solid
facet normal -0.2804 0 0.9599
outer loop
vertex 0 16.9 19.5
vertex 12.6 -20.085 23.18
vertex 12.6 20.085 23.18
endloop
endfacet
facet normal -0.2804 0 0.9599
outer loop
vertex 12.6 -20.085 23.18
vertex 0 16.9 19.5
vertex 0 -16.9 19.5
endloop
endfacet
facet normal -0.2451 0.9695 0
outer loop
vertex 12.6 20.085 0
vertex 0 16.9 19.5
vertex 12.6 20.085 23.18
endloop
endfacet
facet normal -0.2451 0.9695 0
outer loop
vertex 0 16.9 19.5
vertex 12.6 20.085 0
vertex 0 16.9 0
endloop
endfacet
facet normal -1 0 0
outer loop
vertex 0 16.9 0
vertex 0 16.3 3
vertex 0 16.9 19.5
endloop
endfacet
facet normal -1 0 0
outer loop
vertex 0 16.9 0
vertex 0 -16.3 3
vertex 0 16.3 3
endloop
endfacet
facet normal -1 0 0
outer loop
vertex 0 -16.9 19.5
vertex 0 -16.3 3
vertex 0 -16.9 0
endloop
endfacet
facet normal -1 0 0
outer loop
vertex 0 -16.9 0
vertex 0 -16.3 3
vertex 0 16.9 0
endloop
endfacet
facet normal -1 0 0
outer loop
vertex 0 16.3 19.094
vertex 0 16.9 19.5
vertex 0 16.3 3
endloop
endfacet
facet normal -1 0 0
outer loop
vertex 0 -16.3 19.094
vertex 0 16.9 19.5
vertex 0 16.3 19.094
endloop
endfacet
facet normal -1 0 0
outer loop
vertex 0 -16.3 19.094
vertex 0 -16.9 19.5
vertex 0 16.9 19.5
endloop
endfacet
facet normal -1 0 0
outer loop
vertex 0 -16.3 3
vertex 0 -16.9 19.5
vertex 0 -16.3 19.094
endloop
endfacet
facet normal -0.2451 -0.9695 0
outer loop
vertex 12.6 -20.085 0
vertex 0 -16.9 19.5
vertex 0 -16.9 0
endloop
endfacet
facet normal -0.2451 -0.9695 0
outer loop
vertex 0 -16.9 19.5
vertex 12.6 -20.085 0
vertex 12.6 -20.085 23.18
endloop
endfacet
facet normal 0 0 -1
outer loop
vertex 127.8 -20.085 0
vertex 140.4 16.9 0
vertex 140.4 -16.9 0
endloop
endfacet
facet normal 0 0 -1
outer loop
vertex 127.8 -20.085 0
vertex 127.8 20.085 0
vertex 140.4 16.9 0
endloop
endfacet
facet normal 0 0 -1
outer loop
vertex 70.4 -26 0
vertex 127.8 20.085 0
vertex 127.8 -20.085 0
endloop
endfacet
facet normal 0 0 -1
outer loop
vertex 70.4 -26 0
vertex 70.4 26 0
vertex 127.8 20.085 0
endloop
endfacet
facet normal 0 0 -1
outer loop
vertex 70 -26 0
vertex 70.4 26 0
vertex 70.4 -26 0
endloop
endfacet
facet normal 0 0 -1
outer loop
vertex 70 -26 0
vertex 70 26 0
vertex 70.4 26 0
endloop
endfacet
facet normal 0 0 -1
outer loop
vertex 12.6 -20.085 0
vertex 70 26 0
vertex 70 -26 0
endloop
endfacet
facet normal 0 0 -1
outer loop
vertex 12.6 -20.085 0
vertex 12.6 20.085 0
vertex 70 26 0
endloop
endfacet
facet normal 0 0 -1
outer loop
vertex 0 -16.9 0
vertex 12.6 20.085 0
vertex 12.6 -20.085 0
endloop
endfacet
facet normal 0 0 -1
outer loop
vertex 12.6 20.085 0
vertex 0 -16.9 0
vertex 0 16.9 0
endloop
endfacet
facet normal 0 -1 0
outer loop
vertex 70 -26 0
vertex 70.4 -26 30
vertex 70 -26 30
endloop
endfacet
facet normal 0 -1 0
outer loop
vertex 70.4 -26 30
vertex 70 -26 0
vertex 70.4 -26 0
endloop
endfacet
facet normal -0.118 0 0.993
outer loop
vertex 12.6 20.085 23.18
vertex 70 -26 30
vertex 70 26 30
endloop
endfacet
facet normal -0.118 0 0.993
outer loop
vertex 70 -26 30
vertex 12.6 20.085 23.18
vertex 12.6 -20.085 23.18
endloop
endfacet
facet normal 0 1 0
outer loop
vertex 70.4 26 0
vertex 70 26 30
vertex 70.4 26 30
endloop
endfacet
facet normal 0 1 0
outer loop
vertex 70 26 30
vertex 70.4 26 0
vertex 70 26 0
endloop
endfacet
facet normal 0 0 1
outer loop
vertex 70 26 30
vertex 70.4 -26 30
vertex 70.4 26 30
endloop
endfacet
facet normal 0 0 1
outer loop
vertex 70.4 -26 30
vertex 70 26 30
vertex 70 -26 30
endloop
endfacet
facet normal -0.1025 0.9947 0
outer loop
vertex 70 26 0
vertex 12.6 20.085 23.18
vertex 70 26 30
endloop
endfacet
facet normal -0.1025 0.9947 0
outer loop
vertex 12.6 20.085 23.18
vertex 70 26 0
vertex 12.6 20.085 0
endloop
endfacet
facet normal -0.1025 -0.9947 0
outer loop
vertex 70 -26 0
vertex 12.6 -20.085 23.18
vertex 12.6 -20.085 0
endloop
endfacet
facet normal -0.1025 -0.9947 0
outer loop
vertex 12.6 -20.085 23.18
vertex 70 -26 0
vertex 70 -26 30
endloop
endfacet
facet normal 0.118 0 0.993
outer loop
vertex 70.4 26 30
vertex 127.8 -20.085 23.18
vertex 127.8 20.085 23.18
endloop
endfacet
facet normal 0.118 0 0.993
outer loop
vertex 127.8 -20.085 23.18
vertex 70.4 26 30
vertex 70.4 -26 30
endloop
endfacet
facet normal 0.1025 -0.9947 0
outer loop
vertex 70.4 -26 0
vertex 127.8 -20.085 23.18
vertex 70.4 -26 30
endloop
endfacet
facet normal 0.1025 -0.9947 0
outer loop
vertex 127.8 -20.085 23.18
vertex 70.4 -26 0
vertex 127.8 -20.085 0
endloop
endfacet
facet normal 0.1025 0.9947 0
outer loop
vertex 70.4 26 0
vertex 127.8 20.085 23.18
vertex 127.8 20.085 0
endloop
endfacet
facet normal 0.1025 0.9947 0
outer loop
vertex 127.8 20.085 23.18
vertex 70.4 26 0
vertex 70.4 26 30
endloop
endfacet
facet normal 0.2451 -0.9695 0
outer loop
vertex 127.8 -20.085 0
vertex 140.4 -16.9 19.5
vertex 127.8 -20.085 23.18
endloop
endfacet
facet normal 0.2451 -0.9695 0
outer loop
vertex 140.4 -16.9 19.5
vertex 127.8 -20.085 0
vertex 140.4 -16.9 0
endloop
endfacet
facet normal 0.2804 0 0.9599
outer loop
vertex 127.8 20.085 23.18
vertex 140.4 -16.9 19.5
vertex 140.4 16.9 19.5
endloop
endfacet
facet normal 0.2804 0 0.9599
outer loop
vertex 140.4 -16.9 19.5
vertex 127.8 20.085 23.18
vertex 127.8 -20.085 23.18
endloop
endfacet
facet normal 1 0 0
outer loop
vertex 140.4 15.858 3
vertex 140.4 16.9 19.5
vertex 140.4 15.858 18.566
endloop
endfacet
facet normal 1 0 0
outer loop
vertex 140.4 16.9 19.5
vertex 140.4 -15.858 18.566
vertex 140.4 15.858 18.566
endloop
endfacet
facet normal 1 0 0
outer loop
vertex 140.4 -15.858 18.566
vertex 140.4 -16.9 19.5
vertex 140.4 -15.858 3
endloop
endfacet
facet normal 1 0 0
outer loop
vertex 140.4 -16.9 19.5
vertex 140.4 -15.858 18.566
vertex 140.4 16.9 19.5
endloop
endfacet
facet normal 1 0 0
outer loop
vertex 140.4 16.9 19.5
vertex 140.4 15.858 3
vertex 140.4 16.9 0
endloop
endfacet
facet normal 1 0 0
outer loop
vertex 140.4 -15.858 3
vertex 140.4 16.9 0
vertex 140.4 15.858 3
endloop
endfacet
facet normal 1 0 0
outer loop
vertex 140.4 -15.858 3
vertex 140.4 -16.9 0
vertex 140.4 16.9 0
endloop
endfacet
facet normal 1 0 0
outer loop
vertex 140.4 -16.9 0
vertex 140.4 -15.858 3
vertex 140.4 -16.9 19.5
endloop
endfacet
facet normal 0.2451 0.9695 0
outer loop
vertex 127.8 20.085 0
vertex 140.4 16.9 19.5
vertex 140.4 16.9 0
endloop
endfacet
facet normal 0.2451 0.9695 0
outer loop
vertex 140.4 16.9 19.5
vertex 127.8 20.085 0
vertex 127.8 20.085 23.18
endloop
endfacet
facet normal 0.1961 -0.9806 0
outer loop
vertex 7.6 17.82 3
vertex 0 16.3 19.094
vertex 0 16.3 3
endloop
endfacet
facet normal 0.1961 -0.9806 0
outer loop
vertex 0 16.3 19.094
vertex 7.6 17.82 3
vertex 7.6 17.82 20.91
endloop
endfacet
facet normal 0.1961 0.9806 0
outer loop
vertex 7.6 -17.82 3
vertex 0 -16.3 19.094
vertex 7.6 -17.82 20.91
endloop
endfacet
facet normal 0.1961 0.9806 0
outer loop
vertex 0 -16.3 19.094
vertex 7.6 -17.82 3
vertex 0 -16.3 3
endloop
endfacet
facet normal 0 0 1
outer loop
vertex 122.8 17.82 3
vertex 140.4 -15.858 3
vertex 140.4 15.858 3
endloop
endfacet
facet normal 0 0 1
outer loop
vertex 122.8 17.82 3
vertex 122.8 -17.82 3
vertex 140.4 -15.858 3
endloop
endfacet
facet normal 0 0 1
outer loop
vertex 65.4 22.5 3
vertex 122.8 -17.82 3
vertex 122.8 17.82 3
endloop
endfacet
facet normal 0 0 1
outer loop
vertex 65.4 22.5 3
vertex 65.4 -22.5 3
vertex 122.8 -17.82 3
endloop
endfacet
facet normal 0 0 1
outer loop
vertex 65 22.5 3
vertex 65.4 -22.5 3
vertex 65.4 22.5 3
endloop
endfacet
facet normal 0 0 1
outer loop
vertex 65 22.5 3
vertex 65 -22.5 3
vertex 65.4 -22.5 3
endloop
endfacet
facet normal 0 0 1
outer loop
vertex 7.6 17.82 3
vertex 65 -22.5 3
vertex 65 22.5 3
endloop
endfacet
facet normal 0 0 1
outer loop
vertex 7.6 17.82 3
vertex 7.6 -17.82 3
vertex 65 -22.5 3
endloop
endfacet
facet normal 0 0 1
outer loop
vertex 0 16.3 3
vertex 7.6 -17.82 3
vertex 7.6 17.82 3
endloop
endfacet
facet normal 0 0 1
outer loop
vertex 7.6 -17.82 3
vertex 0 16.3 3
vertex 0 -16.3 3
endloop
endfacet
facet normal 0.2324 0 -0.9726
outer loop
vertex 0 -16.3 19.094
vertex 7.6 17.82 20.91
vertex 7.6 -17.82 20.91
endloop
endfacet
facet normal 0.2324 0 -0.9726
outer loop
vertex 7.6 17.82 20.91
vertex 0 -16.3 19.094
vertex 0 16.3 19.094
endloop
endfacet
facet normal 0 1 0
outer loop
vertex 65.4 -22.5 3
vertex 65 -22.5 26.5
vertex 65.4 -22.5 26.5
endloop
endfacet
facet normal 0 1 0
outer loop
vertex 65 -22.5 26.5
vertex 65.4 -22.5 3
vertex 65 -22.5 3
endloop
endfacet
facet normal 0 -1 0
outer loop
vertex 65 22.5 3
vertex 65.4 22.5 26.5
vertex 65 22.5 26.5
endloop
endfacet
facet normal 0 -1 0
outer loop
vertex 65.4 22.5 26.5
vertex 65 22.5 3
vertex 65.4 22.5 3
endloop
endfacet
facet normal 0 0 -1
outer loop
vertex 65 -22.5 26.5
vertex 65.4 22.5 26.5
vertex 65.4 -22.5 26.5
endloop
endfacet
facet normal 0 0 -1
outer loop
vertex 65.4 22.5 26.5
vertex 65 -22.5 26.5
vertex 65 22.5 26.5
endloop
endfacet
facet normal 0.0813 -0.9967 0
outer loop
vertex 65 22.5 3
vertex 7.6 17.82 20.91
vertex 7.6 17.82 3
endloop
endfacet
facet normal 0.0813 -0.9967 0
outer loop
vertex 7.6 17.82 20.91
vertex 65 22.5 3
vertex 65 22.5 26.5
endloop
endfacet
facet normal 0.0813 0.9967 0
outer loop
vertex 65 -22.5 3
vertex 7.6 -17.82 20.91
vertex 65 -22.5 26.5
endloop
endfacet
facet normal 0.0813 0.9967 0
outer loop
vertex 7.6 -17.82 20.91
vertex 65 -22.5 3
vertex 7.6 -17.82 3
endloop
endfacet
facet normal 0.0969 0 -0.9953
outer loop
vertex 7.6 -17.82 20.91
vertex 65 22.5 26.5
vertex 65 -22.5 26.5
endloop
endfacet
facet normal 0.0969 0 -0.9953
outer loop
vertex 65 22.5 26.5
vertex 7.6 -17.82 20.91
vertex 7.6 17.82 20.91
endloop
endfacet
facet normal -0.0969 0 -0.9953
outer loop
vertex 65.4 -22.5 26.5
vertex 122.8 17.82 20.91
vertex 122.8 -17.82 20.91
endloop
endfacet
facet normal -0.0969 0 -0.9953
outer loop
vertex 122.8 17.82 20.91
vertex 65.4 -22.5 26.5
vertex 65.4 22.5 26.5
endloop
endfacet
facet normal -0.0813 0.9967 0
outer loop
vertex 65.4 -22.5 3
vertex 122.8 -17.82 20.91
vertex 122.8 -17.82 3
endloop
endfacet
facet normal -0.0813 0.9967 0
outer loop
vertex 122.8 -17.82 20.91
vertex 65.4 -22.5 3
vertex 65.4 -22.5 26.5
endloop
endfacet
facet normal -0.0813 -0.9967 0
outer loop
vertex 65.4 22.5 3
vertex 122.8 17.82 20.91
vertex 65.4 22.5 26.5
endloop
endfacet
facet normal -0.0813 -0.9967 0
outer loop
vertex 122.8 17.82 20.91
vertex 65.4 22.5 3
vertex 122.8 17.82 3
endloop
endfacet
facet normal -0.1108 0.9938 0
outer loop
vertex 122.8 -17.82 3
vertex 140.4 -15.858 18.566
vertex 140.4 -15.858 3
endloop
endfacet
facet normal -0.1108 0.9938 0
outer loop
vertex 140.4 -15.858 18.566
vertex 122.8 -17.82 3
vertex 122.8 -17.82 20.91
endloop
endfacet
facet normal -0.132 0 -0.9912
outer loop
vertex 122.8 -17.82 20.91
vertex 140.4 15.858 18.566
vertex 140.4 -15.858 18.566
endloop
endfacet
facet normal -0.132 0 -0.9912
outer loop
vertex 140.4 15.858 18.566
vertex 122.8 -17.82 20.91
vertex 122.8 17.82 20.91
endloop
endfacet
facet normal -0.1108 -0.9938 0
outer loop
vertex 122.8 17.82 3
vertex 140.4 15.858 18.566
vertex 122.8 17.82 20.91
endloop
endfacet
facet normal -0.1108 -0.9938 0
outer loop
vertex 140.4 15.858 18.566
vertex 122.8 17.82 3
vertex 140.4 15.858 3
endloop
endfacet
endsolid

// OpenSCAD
$fn = 32;

// ----------------------------------------------------------------------
// Faired channel: 140 x 52 x 30 mm, 3.5 mm walls, faired ends
// ----------------------------------------------------------------------

// --- parameters (mm) ---
length = 140;             // channel length
width = 52;               // channel width at mid length
height = 30;              // channel height at mid length
wall = 3.5;               // side wall thickness
floor_t = 3;              // floor thickness
end_w = 33.8;             // faired end width
end_h = 19.5;             // faired end height

difference() {
  union() {
    hull() {
      translate([0, -16.9, 0]) cube([0.4, 33.8, 19.5]);
      translate([12.6, -20.085, 0]) cube([0.4, 40.17, 23.18]);
    }
    hull() {
      translate([12.6, -20.085, 0]) cube([0.4, 40.17, 23.18]);
      translate([70, -26, 0]) cube([0.4, 52, 30]);
    }
    hull() {
      translate([70, -26, 0]) cube([0.4, 52, 30]);
      translate([127.4, -20.085, 0]) cube([0.4, 40.17, 23.18]);
    }
    hull() {
      translate([127.4, -20.085, 0]) cube([0.4, 40.17, 23.18]);
      translate([140, -16.9, 0]) cube([0.4, 33.8, 19.5]);
    }
  }
  /* cavity, 5 mm proud of both ends so the ports are cut clean */
  hull() {
    translate([-5, -15.3, 3]) cube([0.4, 30.6, 14.9]);
    translate([7.6, -17.82, 3]) cube([0.4, 35.64, 17.91]);
  }
  hull() {
    translate([7.6, -17.82, 3]) cube([0.4, 35.64, 17.91]);
    translate([65, -22.5, 3]) cube([0.4, 45, 23.5]);
  }
  hull() {
    translate([65, -22.5, 3]) cube([0.4, 45, 23.5]);
    translate([122.4, -17.82, 3]) cube([0.4, 35.64, 17.91]);
  }
  hull() {
    translate([122.4, -17.82, 3]) cube([0.4, 35.64, 17.91]);
    translate([145, -15.3, 3]) cube([0.4, 30.6, 14.9]);
  }
}
